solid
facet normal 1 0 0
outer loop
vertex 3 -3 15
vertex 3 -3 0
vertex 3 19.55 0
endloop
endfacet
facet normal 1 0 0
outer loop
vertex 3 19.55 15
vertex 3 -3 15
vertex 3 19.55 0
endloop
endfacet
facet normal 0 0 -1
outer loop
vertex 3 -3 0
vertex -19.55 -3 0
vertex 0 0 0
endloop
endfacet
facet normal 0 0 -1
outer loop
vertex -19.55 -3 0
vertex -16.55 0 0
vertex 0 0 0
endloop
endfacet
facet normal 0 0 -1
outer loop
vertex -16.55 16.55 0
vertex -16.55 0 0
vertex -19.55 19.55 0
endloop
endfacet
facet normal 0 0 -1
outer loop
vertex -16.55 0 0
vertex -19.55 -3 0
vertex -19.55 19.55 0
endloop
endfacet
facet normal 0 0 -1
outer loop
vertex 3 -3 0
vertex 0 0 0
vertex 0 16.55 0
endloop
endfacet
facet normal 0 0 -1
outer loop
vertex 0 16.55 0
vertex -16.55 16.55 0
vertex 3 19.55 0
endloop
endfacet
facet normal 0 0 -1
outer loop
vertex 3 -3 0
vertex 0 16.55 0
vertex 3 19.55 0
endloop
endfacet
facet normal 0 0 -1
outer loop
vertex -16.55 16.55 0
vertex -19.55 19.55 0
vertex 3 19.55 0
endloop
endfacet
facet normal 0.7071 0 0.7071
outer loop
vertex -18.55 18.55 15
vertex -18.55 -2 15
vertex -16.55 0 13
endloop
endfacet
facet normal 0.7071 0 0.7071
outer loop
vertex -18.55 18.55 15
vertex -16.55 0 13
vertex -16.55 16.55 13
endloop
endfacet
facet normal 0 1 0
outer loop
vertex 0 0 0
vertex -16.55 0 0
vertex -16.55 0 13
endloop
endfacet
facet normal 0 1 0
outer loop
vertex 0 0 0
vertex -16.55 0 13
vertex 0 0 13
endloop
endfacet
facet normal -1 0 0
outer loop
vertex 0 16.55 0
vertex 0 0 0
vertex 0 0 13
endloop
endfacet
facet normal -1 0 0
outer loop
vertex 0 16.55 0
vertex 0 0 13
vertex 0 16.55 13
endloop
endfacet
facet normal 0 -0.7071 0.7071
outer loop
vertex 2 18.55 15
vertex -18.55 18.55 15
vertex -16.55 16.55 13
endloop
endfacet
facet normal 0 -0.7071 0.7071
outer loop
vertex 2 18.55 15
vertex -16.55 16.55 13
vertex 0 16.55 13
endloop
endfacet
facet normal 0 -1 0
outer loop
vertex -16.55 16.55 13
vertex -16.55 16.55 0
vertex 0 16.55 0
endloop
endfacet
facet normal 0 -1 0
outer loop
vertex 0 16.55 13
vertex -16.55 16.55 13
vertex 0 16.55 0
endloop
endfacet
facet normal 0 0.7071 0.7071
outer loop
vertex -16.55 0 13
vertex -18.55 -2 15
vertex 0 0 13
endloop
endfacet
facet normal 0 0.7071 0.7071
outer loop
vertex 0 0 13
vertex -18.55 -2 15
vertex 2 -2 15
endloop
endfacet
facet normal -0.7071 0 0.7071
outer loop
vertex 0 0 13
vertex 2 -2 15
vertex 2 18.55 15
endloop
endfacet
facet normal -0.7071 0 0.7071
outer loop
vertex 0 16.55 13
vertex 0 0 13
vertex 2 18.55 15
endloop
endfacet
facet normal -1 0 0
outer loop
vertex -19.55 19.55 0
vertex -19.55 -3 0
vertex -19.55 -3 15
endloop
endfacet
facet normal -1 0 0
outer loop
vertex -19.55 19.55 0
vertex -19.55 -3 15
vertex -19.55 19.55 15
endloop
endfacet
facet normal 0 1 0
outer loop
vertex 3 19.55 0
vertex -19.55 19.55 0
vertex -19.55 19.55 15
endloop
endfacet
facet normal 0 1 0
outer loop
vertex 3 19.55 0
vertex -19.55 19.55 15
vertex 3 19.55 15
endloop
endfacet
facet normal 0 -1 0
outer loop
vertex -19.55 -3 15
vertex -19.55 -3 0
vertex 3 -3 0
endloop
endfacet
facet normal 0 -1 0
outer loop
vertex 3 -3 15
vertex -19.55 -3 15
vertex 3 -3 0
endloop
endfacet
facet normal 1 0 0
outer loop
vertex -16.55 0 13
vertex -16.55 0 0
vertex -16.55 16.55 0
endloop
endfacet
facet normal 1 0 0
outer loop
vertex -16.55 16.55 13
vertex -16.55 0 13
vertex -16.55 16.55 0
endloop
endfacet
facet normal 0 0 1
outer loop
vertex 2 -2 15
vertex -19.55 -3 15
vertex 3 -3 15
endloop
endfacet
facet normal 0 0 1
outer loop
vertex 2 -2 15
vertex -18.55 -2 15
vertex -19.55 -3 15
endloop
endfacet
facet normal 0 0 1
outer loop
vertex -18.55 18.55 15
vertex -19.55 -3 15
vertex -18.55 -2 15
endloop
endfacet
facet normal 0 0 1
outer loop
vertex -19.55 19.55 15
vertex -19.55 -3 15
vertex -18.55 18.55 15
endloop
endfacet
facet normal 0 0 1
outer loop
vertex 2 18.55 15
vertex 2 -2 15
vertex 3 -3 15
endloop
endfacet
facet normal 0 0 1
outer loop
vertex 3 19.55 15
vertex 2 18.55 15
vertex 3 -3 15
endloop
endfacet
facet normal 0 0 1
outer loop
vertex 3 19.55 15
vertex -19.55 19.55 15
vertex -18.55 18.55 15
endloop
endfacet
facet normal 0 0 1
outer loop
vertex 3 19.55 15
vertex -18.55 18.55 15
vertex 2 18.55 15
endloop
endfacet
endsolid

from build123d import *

# Parameters (mm, degrees)
F0_W     = 22.55
F0_H     = 22.55
F0_W_2   = 16.55
F0_H_2   = 16.55
F1_DEPTH = 5
F2_DEPTH = 15
F3_SIZE  = 2


with BuildPart() as f1:
    # F0 (on Top) → F1 (new body)
    with BuildSketch(Plane.XY):
        with Locations((-8.275, 8.275)):
            Rectangle(F0_W, F0_H)
        with Locations((-8.275, 8.275)):
            Rectangle(F0_W_2, F0_H_2, mode=Mode.SUBTRACT)
    extrude(amount=F1_DEPTH)

    # F0 (on Top) → F2 (join)
    with BuildSketch(Plane.XY):
        with Locations((-8.275, 8.275)):
            Rectangle(F0_W, F0_H)
        with Locations((-8.275, 8.275)):
            Rectangle(F0_W_2, F0_H_2, mode=Mode.SUBTRACT)
    extrude(amount=F2_DEPTH)

    # F3
    f3_edges = [f1.edges().sort_by_distance(p)[0] for p in [
        (-8.275, 16.55, 15),
        (-16.55, 8.275, 15),
        (0, 8.275, 15),
        (-8.275, 0, 15),
    ]]
    chamfer(f3_edges, length=F3_SIZE)


solid = f1.part
